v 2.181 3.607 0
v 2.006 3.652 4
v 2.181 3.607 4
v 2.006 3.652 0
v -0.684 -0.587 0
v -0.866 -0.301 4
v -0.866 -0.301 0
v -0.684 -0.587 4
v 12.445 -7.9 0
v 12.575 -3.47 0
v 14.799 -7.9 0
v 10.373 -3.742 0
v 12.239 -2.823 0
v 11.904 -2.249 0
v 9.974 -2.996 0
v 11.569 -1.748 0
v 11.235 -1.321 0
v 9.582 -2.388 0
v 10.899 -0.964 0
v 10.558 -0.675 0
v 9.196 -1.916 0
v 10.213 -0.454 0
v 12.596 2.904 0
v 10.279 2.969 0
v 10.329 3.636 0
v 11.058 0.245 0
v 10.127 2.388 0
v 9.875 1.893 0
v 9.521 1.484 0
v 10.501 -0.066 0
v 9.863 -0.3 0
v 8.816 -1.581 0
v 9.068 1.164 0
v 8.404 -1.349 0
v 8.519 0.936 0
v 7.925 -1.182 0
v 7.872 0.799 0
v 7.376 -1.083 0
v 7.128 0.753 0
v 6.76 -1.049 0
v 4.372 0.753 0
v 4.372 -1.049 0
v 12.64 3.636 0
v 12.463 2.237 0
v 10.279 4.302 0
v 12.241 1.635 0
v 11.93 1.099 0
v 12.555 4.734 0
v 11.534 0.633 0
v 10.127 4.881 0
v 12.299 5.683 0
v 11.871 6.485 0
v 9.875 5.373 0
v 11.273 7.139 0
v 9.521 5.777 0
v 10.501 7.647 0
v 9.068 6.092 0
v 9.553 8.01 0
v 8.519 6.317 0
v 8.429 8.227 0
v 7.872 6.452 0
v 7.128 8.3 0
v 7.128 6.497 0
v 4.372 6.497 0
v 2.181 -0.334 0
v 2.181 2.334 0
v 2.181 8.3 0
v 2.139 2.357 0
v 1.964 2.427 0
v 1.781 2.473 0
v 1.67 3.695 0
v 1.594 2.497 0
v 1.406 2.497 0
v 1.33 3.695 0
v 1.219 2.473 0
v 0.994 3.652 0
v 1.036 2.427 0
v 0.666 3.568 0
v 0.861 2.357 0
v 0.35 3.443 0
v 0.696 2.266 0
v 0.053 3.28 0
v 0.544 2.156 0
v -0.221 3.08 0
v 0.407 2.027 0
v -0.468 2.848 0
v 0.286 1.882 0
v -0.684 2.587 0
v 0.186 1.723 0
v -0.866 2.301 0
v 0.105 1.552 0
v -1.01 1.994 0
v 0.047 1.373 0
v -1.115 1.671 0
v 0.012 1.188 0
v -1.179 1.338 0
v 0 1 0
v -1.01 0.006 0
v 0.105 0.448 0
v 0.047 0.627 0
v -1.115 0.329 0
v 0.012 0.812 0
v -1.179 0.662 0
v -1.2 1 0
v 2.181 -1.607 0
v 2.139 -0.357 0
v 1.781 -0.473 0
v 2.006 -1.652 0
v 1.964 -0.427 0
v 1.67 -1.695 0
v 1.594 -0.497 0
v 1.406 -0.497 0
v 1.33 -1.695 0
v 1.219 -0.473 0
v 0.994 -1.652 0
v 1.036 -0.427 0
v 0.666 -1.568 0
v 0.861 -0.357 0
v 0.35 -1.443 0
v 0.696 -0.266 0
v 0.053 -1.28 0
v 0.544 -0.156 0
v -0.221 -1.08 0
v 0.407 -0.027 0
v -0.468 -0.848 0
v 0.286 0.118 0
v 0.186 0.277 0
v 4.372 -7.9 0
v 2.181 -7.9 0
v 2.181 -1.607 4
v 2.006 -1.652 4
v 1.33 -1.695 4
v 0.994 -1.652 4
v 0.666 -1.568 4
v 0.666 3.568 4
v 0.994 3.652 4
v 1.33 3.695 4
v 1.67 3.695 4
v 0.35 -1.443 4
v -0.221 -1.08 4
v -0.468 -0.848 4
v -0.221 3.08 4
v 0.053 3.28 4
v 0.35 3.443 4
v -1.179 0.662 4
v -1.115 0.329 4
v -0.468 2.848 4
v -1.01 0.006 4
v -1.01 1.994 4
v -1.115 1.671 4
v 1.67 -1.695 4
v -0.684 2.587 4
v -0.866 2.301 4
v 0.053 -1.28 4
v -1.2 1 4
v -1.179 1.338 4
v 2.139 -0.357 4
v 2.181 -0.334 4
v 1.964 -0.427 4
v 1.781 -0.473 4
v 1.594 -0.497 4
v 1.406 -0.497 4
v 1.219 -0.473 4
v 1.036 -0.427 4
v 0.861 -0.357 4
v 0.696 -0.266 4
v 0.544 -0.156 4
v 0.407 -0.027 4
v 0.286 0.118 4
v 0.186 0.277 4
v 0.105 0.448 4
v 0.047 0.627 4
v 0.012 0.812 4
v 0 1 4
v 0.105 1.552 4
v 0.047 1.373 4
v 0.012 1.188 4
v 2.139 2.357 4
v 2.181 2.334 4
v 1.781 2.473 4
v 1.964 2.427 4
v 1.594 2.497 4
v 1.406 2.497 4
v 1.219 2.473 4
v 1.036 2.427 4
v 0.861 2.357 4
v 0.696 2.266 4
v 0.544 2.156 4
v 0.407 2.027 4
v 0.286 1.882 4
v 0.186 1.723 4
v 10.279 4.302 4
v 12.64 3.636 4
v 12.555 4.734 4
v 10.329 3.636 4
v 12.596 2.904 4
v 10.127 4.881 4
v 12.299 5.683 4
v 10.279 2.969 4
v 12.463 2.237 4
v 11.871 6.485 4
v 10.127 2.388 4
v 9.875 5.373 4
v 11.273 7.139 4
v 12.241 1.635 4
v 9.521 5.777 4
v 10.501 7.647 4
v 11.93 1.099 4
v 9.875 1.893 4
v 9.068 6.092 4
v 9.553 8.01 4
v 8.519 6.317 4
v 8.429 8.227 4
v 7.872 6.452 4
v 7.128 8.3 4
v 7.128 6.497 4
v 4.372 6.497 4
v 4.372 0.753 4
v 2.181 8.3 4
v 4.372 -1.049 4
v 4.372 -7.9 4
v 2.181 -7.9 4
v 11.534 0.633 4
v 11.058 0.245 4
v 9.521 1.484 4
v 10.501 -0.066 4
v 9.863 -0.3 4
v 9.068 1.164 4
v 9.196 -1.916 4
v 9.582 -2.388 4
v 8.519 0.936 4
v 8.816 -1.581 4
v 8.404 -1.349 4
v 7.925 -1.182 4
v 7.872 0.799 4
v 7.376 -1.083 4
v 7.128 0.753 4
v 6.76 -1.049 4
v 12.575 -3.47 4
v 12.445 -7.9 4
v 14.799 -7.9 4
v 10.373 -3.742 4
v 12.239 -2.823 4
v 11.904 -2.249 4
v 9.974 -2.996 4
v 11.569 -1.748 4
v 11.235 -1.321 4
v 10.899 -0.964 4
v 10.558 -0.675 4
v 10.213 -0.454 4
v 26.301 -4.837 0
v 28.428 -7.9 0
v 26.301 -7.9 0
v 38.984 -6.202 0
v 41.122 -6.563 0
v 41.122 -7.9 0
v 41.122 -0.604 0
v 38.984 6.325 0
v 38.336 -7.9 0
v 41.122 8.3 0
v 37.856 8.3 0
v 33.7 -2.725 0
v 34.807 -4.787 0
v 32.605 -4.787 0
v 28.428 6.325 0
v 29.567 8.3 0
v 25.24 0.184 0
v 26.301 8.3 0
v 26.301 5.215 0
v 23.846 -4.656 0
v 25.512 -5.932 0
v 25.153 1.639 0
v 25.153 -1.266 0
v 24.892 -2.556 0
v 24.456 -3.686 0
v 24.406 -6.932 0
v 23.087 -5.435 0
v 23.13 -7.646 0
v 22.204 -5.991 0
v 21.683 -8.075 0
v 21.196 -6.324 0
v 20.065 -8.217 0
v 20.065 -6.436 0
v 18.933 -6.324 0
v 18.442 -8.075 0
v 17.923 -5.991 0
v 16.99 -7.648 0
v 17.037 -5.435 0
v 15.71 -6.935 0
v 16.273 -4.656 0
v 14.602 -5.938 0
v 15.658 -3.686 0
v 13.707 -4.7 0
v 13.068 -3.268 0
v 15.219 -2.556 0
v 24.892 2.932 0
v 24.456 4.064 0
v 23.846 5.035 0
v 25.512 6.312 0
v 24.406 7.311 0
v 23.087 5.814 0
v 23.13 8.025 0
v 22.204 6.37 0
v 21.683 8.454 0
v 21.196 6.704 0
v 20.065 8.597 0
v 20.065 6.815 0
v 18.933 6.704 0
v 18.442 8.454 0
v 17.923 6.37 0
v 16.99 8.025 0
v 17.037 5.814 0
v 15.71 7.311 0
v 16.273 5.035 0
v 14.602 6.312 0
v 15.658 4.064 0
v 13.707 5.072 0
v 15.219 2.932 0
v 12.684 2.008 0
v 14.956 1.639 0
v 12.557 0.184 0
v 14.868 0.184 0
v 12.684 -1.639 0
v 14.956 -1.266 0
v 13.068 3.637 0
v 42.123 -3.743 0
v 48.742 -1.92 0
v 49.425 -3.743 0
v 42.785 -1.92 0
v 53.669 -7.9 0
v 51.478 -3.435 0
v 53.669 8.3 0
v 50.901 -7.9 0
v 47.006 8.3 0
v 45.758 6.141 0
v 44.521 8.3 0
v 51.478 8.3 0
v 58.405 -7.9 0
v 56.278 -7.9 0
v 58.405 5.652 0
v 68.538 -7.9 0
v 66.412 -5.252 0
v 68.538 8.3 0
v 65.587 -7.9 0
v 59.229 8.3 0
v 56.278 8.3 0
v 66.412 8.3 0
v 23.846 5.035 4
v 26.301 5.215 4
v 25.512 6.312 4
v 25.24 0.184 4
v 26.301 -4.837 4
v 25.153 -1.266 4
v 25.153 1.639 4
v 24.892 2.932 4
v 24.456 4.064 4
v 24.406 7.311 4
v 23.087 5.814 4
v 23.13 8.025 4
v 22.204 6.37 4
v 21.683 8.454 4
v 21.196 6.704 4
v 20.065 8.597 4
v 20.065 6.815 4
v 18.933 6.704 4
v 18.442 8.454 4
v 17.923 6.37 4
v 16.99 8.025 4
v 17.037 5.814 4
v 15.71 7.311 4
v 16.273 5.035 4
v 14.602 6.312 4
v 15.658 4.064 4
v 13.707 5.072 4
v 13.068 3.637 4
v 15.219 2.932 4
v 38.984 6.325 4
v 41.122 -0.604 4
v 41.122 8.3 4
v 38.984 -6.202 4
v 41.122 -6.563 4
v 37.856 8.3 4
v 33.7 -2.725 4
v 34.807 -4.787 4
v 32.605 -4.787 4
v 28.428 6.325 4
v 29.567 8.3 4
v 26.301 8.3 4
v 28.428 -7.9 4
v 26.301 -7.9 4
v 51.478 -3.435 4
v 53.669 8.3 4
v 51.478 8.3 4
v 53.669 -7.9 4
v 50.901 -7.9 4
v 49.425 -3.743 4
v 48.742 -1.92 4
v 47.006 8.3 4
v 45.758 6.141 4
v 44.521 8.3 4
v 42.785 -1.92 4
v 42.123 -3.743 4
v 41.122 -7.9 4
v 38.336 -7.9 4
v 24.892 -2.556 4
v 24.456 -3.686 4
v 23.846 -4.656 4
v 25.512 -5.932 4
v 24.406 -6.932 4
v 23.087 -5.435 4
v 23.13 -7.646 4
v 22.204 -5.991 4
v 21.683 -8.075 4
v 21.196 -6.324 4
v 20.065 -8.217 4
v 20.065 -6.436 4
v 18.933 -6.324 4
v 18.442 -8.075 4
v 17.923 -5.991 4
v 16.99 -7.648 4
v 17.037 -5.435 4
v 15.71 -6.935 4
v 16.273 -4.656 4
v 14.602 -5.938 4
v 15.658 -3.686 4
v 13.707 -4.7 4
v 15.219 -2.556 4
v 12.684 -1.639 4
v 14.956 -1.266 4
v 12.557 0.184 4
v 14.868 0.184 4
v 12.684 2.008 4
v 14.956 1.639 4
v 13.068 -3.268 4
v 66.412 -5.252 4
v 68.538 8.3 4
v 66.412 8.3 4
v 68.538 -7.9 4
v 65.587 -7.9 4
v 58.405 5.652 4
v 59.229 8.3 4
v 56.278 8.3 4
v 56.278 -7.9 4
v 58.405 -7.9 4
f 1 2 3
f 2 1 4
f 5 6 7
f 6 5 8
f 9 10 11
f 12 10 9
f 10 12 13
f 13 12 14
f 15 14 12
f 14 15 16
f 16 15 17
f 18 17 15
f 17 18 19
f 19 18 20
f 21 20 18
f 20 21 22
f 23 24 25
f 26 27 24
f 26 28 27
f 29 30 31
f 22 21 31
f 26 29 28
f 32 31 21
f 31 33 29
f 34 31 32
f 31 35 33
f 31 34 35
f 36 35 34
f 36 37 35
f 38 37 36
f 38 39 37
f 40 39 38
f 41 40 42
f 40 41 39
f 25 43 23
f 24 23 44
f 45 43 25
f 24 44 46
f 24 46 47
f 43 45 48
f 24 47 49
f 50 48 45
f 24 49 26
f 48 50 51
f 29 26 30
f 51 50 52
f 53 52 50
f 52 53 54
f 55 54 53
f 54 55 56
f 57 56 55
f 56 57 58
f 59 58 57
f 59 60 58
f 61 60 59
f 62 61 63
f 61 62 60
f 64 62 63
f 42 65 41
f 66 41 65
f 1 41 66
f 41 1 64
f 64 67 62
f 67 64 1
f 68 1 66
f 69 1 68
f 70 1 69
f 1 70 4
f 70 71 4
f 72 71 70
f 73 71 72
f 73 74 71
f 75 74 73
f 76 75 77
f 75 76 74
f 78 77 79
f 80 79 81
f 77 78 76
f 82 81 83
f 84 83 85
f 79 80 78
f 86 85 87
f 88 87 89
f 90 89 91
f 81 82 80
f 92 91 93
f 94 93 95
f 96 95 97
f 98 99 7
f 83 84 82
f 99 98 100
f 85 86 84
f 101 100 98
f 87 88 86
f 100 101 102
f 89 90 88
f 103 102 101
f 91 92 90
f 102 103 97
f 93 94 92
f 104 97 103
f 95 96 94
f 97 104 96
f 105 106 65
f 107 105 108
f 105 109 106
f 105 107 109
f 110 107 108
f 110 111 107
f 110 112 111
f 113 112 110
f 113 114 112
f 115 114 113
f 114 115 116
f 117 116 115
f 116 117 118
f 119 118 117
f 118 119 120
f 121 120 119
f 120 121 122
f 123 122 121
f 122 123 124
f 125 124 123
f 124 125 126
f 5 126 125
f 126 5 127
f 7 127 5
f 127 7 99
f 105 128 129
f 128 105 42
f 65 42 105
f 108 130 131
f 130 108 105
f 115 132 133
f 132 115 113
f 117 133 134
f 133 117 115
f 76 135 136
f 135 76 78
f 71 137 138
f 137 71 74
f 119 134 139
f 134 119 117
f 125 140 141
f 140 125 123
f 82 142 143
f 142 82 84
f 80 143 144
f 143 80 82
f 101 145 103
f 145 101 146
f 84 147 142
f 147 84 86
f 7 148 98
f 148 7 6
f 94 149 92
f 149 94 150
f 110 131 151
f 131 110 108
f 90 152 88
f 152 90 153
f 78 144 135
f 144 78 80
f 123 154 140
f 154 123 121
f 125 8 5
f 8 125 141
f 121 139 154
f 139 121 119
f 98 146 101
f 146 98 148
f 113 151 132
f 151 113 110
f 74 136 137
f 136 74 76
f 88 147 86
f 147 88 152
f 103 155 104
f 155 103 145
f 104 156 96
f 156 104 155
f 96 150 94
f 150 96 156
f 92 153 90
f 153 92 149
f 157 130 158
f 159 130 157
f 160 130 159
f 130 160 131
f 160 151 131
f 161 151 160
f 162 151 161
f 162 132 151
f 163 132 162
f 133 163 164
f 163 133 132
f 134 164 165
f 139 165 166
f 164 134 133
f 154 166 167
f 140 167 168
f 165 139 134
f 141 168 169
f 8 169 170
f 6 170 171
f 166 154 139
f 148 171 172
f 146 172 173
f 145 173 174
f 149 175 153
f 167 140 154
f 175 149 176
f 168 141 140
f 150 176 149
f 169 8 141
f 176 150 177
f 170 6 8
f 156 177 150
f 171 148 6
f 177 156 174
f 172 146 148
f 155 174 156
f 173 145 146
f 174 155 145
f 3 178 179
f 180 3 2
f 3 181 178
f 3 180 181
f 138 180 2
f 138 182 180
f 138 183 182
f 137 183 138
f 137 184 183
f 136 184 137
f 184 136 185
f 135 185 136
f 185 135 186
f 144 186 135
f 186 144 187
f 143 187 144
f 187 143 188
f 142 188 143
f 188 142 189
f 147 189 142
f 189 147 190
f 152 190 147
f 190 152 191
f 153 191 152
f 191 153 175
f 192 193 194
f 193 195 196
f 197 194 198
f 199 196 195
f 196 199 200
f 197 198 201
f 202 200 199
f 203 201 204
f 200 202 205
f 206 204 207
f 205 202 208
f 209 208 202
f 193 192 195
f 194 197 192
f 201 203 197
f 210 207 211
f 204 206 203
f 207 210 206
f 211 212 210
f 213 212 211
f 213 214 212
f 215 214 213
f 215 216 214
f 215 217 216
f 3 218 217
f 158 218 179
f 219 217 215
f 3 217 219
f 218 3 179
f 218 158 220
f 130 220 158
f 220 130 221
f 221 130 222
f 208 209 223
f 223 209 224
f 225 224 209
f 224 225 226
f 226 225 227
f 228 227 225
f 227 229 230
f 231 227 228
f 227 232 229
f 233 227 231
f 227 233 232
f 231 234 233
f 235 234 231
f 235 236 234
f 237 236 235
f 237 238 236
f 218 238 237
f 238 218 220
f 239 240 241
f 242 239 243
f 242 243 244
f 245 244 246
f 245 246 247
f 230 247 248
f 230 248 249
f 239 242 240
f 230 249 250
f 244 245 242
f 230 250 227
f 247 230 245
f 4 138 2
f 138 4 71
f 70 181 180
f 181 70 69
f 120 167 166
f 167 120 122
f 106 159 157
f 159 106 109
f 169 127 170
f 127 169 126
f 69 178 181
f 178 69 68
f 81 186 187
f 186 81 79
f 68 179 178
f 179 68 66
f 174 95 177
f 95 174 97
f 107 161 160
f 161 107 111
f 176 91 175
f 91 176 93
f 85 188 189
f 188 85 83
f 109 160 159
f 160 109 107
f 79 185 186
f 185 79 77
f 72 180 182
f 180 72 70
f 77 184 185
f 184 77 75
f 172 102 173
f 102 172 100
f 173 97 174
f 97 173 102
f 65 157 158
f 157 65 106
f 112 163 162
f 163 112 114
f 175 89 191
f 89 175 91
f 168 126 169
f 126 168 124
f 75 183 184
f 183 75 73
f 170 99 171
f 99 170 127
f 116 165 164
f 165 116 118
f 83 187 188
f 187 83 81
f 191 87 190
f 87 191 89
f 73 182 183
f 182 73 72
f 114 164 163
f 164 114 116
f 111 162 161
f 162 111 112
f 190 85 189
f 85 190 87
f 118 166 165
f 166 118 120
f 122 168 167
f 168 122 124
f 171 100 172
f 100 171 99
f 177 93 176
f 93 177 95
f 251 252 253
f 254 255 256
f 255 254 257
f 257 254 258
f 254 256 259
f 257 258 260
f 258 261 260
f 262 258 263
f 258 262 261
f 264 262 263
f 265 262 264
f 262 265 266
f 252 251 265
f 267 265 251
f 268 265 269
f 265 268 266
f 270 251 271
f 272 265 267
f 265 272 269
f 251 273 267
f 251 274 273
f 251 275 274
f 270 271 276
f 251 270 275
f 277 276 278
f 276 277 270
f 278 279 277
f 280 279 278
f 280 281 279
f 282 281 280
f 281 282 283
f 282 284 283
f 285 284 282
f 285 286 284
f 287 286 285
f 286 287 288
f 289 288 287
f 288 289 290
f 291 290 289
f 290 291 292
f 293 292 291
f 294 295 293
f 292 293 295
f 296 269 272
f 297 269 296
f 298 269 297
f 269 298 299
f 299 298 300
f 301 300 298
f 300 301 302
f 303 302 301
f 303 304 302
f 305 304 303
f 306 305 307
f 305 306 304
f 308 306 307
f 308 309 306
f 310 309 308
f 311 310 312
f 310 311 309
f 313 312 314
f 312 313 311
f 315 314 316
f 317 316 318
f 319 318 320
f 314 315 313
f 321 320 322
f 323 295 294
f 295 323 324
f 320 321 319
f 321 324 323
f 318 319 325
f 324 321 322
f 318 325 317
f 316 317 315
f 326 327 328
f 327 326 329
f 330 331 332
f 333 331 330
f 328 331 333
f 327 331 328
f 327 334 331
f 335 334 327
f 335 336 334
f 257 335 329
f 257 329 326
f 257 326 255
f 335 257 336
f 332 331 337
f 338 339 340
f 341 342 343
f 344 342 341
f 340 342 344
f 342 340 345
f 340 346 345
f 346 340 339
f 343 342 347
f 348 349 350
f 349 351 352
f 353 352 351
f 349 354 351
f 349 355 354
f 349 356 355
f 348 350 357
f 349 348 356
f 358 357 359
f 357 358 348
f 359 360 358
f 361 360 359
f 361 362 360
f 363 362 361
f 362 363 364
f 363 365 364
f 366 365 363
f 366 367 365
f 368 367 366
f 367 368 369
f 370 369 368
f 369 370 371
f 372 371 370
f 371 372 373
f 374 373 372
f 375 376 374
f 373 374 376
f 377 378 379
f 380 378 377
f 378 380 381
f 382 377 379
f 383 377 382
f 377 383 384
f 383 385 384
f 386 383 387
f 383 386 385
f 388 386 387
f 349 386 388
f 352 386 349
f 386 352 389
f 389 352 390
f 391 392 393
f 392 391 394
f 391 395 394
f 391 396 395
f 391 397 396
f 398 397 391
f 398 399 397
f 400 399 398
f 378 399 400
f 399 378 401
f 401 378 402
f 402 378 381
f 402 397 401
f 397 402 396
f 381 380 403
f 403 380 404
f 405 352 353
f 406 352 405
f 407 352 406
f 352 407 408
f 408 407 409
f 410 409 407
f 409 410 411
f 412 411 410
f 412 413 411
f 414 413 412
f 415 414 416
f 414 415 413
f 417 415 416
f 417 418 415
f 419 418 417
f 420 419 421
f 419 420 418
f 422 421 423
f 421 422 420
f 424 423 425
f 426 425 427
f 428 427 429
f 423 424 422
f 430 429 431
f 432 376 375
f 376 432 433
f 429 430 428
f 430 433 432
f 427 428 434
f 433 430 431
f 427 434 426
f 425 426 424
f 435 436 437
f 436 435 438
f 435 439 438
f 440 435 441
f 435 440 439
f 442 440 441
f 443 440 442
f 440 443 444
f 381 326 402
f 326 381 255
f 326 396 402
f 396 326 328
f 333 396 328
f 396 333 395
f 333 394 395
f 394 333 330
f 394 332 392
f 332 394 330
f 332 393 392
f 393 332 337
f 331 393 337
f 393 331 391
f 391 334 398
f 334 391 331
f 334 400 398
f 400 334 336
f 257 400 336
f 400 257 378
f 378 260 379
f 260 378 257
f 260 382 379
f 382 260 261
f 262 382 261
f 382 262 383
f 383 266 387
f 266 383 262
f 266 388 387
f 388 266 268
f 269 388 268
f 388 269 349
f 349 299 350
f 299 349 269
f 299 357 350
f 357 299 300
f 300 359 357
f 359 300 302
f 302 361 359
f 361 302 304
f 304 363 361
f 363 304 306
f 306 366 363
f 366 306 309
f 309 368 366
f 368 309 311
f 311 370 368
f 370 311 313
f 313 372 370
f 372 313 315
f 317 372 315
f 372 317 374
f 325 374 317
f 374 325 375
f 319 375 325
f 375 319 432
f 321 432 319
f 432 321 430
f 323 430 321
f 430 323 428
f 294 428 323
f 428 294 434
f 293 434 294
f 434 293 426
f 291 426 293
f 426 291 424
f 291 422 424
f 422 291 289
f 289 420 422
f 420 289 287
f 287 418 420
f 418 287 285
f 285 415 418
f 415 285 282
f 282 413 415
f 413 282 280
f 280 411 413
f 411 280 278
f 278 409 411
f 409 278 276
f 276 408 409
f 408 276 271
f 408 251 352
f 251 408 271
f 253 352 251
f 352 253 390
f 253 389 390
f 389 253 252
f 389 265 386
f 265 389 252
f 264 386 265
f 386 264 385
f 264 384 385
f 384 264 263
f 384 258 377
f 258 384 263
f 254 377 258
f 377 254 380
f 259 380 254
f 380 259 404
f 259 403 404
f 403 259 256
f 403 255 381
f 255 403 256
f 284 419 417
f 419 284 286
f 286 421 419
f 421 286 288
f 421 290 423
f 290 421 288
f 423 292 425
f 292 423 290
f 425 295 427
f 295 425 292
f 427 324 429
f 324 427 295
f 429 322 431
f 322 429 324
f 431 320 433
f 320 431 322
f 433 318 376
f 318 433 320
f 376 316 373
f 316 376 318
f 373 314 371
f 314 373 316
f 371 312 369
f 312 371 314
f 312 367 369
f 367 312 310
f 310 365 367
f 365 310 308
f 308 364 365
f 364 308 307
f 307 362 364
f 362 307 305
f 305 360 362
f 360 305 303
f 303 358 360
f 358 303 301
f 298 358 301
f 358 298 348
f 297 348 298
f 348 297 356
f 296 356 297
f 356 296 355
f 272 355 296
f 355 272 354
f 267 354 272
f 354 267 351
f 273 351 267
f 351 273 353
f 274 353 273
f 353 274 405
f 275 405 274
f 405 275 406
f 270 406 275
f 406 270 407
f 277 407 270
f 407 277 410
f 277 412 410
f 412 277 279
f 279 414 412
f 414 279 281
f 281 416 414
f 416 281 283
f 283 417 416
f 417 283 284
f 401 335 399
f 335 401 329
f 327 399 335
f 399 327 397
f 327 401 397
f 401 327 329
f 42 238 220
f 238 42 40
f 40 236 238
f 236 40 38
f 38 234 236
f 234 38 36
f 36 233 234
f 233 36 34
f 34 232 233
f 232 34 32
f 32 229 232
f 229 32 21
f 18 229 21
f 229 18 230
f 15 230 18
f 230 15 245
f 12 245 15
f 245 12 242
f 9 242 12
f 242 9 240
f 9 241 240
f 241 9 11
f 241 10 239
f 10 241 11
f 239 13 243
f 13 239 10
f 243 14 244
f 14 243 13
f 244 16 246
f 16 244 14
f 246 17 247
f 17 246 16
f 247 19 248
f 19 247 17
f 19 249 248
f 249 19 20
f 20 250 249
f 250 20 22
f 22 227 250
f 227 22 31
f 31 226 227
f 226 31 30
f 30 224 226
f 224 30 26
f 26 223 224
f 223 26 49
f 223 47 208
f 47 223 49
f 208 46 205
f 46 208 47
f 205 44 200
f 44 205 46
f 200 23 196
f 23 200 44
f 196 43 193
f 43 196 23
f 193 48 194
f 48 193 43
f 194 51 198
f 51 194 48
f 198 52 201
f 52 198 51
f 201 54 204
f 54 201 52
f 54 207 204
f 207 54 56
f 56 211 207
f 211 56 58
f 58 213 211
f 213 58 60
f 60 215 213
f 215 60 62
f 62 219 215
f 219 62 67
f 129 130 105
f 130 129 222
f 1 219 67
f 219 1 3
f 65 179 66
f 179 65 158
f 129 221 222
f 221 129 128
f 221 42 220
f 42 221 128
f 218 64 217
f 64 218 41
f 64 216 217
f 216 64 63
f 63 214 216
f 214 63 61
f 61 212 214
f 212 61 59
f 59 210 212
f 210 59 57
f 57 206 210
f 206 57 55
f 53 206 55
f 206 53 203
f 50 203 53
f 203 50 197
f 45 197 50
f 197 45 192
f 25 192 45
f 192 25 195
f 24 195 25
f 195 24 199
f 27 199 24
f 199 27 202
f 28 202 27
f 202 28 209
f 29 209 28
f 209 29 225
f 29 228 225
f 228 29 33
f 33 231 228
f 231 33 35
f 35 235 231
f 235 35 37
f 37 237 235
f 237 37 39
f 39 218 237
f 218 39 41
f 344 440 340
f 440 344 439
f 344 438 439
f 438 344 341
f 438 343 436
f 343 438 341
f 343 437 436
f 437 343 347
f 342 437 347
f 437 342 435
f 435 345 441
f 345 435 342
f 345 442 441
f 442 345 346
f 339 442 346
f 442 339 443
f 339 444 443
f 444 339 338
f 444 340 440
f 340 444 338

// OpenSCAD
// preview[view:south, tilt:top]

// The name to show
name="ROMAIN";

// Almost any font from https://fonts.google.com/
letter_font="Fontdiner Swanky";

// If the letter does not touch, try a lower letter_spacing value
letter_spacing=0.75; // [0:0.01:1.4]

// Diameter of the ring in mm
ring_diameter=3;

// Thickness of the ring
ring_thickness=1.2;

// Set an offset, so the ring is attached to the first letter
ring_offset=1.5;

// Keychain thickness
keychain_thickness=4;


ring_radius=ring_diameter/2;
// convexity is needed for correct preview
// since characters can be highly concave
linear_extrude(height=keychain_thickness, convexity=4)
                text(name, size=16,
                     font=letter_font,
                     halign="left",
                     valign="center",
                     spacing=letter_spacing);
 translate([ring_offset,1,0]) difference() {
     cylinder(keychain_thickness, ring_radius+ring_thickness, ring_radius+ring_thickness, $fn=50);
     translate([0,0,-0.5])
         cylinder(keychain_thickness+1, ring_radius, ring_radius, $fn=50);
 }
